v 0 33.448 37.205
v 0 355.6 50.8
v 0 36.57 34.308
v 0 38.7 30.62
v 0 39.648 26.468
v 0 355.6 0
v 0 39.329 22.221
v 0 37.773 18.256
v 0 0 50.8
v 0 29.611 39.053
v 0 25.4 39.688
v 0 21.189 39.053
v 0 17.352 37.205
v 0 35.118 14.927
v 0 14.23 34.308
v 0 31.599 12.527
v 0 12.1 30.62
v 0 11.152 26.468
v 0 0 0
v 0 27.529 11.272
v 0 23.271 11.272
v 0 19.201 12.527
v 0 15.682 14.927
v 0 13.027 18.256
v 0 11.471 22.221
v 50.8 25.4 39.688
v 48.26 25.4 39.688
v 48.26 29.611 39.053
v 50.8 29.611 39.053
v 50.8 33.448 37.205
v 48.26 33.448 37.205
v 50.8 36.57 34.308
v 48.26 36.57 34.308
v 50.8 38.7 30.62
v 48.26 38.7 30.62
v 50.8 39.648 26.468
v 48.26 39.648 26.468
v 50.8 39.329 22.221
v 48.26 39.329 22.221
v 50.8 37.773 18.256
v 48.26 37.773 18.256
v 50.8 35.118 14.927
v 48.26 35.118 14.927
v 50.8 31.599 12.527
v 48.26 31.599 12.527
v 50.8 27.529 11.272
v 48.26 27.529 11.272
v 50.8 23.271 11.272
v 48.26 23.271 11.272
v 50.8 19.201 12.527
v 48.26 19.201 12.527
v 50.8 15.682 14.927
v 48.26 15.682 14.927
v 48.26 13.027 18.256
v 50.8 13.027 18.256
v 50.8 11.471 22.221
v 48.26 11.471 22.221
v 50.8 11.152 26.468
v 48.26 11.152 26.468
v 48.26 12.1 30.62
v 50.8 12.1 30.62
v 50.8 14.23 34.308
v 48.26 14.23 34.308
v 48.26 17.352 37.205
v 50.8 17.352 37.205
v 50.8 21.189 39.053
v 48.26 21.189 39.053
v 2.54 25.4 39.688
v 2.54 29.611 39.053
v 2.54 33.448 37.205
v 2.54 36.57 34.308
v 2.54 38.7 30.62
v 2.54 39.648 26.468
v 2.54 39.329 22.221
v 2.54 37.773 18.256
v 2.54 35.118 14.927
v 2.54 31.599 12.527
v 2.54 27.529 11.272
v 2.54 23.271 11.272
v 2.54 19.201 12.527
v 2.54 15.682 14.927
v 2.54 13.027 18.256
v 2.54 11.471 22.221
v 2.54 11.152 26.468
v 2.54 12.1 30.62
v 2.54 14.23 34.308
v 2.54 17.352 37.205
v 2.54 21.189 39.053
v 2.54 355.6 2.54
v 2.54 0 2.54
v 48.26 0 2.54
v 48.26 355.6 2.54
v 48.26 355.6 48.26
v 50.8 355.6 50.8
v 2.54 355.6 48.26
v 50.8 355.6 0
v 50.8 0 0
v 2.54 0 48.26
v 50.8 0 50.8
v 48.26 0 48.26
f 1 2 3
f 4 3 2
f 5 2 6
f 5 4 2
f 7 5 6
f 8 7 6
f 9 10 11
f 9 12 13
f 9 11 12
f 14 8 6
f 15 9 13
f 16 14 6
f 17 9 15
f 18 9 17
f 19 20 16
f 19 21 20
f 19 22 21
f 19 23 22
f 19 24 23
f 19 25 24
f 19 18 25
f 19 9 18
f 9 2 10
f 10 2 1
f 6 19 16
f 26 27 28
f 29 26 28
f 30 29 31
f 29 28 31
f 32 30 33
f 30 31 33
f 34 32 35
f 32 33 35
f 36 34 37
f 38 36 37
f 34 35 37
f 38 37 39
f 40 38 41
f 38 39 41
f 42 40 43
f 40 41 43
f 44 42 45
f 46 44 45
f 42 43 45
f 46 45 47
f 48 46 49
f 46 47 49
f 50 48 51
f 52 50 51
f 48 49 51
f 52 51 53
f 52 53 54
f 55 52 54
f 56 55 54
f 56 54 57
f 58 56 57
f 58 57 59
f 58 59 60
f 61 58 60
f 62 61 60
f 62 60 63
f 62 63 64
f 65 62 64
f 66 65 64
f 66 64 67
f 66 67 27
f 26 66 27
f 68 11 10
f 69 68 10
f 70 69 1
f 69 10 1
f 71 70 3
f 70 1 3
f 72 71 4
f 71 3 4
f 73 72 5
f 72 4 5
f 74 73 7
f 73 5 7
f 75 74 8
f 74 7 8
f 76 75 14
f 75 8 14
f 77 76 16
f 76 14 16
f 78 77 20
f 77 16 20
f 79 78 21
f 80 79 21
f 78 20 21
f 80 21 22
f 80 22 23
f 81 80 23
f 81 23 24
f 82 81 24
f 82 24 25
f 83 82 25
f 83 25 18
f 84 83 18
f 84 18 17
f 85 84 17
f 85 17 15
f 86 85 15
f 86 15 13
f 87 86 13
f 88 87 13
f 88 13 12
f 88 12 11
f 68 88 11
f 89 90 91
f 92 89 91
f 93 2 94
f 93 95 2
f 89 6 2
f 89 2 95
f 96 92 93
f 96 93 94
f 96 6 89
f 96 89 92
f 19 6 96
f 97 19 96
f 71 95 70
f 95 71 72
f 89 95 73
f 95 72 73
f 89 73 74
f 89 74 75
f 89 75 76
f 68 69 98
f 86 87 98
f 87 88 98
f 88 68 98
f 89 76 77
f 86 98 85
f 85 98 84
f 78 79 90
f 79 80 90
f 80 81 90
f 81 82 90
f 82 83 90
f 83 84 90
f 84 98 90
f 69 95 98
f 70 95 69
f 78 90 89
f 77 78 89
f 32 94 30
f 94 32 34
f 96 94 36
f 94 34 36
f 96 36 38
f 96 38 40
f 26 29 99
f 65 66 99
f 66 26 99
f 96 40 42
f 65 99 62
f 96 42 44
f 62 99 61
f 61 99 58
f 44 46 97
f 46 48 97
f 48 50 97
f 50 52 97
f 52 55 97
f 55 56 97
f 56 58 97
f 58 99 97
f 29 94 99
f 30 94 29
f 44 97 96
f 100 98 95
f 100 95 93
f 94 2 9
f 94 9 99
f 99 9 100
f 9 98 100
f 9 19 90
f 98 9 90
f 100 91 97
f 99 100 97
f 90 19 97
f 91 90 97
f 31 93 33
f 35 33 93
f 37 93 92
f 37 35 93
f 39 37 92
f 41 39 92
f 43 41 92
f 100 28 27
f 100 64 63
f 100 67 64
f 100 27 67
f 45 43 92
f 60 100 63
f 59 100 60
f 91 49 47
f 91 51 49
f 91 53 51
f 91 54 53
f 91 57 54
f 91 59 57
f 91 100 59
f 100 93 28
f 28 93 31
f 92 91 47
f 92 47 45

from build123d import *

# Parameters (mm, degrees)
SKETCH1_W           = 50.8
SKETCH1_H           = 50.8
SKETCH1_W_2         = 45.72
SKETCH1_H_2         = 45.72
BOSS_EXTRUDE1_DEPTH = 355.6
SKETCH2_R           = 14.2875
CUT_EXTRUDE1_DEPTH  = 50.8


with BuildPart() as part:
    # Sketch1 → Boss-Extrude1 (new body)
    with BuildSketch(Plane(origin=(0, 0, 0), x_dir=(1, 0, 0), z_dir=(0, 1, 0))):
        with Locations((25.4, -25.4)):
            Rectangle(SKETCH1_W, SKETCH1_H)
        with Locations((25.4, -25.4)):
            Rectangle(SKETCH1_W_2, SKETCH1_H_2, mode=Mode.SUBTRACT)
    extrude(amount=BOSS_EXTRUDE1_DEPTH)

    # Sketch2 → Cut-Extrude1 (cut)
    with BuildSketch(Plane.ZY):
        with Locations((25.4, 25.4)):
            Circle(SKETCH2_R)
    extrude(amount=-CUT_EXTRUDE1_DEPTH, mode=Mode.SUBTRACT)


solid = part.part
